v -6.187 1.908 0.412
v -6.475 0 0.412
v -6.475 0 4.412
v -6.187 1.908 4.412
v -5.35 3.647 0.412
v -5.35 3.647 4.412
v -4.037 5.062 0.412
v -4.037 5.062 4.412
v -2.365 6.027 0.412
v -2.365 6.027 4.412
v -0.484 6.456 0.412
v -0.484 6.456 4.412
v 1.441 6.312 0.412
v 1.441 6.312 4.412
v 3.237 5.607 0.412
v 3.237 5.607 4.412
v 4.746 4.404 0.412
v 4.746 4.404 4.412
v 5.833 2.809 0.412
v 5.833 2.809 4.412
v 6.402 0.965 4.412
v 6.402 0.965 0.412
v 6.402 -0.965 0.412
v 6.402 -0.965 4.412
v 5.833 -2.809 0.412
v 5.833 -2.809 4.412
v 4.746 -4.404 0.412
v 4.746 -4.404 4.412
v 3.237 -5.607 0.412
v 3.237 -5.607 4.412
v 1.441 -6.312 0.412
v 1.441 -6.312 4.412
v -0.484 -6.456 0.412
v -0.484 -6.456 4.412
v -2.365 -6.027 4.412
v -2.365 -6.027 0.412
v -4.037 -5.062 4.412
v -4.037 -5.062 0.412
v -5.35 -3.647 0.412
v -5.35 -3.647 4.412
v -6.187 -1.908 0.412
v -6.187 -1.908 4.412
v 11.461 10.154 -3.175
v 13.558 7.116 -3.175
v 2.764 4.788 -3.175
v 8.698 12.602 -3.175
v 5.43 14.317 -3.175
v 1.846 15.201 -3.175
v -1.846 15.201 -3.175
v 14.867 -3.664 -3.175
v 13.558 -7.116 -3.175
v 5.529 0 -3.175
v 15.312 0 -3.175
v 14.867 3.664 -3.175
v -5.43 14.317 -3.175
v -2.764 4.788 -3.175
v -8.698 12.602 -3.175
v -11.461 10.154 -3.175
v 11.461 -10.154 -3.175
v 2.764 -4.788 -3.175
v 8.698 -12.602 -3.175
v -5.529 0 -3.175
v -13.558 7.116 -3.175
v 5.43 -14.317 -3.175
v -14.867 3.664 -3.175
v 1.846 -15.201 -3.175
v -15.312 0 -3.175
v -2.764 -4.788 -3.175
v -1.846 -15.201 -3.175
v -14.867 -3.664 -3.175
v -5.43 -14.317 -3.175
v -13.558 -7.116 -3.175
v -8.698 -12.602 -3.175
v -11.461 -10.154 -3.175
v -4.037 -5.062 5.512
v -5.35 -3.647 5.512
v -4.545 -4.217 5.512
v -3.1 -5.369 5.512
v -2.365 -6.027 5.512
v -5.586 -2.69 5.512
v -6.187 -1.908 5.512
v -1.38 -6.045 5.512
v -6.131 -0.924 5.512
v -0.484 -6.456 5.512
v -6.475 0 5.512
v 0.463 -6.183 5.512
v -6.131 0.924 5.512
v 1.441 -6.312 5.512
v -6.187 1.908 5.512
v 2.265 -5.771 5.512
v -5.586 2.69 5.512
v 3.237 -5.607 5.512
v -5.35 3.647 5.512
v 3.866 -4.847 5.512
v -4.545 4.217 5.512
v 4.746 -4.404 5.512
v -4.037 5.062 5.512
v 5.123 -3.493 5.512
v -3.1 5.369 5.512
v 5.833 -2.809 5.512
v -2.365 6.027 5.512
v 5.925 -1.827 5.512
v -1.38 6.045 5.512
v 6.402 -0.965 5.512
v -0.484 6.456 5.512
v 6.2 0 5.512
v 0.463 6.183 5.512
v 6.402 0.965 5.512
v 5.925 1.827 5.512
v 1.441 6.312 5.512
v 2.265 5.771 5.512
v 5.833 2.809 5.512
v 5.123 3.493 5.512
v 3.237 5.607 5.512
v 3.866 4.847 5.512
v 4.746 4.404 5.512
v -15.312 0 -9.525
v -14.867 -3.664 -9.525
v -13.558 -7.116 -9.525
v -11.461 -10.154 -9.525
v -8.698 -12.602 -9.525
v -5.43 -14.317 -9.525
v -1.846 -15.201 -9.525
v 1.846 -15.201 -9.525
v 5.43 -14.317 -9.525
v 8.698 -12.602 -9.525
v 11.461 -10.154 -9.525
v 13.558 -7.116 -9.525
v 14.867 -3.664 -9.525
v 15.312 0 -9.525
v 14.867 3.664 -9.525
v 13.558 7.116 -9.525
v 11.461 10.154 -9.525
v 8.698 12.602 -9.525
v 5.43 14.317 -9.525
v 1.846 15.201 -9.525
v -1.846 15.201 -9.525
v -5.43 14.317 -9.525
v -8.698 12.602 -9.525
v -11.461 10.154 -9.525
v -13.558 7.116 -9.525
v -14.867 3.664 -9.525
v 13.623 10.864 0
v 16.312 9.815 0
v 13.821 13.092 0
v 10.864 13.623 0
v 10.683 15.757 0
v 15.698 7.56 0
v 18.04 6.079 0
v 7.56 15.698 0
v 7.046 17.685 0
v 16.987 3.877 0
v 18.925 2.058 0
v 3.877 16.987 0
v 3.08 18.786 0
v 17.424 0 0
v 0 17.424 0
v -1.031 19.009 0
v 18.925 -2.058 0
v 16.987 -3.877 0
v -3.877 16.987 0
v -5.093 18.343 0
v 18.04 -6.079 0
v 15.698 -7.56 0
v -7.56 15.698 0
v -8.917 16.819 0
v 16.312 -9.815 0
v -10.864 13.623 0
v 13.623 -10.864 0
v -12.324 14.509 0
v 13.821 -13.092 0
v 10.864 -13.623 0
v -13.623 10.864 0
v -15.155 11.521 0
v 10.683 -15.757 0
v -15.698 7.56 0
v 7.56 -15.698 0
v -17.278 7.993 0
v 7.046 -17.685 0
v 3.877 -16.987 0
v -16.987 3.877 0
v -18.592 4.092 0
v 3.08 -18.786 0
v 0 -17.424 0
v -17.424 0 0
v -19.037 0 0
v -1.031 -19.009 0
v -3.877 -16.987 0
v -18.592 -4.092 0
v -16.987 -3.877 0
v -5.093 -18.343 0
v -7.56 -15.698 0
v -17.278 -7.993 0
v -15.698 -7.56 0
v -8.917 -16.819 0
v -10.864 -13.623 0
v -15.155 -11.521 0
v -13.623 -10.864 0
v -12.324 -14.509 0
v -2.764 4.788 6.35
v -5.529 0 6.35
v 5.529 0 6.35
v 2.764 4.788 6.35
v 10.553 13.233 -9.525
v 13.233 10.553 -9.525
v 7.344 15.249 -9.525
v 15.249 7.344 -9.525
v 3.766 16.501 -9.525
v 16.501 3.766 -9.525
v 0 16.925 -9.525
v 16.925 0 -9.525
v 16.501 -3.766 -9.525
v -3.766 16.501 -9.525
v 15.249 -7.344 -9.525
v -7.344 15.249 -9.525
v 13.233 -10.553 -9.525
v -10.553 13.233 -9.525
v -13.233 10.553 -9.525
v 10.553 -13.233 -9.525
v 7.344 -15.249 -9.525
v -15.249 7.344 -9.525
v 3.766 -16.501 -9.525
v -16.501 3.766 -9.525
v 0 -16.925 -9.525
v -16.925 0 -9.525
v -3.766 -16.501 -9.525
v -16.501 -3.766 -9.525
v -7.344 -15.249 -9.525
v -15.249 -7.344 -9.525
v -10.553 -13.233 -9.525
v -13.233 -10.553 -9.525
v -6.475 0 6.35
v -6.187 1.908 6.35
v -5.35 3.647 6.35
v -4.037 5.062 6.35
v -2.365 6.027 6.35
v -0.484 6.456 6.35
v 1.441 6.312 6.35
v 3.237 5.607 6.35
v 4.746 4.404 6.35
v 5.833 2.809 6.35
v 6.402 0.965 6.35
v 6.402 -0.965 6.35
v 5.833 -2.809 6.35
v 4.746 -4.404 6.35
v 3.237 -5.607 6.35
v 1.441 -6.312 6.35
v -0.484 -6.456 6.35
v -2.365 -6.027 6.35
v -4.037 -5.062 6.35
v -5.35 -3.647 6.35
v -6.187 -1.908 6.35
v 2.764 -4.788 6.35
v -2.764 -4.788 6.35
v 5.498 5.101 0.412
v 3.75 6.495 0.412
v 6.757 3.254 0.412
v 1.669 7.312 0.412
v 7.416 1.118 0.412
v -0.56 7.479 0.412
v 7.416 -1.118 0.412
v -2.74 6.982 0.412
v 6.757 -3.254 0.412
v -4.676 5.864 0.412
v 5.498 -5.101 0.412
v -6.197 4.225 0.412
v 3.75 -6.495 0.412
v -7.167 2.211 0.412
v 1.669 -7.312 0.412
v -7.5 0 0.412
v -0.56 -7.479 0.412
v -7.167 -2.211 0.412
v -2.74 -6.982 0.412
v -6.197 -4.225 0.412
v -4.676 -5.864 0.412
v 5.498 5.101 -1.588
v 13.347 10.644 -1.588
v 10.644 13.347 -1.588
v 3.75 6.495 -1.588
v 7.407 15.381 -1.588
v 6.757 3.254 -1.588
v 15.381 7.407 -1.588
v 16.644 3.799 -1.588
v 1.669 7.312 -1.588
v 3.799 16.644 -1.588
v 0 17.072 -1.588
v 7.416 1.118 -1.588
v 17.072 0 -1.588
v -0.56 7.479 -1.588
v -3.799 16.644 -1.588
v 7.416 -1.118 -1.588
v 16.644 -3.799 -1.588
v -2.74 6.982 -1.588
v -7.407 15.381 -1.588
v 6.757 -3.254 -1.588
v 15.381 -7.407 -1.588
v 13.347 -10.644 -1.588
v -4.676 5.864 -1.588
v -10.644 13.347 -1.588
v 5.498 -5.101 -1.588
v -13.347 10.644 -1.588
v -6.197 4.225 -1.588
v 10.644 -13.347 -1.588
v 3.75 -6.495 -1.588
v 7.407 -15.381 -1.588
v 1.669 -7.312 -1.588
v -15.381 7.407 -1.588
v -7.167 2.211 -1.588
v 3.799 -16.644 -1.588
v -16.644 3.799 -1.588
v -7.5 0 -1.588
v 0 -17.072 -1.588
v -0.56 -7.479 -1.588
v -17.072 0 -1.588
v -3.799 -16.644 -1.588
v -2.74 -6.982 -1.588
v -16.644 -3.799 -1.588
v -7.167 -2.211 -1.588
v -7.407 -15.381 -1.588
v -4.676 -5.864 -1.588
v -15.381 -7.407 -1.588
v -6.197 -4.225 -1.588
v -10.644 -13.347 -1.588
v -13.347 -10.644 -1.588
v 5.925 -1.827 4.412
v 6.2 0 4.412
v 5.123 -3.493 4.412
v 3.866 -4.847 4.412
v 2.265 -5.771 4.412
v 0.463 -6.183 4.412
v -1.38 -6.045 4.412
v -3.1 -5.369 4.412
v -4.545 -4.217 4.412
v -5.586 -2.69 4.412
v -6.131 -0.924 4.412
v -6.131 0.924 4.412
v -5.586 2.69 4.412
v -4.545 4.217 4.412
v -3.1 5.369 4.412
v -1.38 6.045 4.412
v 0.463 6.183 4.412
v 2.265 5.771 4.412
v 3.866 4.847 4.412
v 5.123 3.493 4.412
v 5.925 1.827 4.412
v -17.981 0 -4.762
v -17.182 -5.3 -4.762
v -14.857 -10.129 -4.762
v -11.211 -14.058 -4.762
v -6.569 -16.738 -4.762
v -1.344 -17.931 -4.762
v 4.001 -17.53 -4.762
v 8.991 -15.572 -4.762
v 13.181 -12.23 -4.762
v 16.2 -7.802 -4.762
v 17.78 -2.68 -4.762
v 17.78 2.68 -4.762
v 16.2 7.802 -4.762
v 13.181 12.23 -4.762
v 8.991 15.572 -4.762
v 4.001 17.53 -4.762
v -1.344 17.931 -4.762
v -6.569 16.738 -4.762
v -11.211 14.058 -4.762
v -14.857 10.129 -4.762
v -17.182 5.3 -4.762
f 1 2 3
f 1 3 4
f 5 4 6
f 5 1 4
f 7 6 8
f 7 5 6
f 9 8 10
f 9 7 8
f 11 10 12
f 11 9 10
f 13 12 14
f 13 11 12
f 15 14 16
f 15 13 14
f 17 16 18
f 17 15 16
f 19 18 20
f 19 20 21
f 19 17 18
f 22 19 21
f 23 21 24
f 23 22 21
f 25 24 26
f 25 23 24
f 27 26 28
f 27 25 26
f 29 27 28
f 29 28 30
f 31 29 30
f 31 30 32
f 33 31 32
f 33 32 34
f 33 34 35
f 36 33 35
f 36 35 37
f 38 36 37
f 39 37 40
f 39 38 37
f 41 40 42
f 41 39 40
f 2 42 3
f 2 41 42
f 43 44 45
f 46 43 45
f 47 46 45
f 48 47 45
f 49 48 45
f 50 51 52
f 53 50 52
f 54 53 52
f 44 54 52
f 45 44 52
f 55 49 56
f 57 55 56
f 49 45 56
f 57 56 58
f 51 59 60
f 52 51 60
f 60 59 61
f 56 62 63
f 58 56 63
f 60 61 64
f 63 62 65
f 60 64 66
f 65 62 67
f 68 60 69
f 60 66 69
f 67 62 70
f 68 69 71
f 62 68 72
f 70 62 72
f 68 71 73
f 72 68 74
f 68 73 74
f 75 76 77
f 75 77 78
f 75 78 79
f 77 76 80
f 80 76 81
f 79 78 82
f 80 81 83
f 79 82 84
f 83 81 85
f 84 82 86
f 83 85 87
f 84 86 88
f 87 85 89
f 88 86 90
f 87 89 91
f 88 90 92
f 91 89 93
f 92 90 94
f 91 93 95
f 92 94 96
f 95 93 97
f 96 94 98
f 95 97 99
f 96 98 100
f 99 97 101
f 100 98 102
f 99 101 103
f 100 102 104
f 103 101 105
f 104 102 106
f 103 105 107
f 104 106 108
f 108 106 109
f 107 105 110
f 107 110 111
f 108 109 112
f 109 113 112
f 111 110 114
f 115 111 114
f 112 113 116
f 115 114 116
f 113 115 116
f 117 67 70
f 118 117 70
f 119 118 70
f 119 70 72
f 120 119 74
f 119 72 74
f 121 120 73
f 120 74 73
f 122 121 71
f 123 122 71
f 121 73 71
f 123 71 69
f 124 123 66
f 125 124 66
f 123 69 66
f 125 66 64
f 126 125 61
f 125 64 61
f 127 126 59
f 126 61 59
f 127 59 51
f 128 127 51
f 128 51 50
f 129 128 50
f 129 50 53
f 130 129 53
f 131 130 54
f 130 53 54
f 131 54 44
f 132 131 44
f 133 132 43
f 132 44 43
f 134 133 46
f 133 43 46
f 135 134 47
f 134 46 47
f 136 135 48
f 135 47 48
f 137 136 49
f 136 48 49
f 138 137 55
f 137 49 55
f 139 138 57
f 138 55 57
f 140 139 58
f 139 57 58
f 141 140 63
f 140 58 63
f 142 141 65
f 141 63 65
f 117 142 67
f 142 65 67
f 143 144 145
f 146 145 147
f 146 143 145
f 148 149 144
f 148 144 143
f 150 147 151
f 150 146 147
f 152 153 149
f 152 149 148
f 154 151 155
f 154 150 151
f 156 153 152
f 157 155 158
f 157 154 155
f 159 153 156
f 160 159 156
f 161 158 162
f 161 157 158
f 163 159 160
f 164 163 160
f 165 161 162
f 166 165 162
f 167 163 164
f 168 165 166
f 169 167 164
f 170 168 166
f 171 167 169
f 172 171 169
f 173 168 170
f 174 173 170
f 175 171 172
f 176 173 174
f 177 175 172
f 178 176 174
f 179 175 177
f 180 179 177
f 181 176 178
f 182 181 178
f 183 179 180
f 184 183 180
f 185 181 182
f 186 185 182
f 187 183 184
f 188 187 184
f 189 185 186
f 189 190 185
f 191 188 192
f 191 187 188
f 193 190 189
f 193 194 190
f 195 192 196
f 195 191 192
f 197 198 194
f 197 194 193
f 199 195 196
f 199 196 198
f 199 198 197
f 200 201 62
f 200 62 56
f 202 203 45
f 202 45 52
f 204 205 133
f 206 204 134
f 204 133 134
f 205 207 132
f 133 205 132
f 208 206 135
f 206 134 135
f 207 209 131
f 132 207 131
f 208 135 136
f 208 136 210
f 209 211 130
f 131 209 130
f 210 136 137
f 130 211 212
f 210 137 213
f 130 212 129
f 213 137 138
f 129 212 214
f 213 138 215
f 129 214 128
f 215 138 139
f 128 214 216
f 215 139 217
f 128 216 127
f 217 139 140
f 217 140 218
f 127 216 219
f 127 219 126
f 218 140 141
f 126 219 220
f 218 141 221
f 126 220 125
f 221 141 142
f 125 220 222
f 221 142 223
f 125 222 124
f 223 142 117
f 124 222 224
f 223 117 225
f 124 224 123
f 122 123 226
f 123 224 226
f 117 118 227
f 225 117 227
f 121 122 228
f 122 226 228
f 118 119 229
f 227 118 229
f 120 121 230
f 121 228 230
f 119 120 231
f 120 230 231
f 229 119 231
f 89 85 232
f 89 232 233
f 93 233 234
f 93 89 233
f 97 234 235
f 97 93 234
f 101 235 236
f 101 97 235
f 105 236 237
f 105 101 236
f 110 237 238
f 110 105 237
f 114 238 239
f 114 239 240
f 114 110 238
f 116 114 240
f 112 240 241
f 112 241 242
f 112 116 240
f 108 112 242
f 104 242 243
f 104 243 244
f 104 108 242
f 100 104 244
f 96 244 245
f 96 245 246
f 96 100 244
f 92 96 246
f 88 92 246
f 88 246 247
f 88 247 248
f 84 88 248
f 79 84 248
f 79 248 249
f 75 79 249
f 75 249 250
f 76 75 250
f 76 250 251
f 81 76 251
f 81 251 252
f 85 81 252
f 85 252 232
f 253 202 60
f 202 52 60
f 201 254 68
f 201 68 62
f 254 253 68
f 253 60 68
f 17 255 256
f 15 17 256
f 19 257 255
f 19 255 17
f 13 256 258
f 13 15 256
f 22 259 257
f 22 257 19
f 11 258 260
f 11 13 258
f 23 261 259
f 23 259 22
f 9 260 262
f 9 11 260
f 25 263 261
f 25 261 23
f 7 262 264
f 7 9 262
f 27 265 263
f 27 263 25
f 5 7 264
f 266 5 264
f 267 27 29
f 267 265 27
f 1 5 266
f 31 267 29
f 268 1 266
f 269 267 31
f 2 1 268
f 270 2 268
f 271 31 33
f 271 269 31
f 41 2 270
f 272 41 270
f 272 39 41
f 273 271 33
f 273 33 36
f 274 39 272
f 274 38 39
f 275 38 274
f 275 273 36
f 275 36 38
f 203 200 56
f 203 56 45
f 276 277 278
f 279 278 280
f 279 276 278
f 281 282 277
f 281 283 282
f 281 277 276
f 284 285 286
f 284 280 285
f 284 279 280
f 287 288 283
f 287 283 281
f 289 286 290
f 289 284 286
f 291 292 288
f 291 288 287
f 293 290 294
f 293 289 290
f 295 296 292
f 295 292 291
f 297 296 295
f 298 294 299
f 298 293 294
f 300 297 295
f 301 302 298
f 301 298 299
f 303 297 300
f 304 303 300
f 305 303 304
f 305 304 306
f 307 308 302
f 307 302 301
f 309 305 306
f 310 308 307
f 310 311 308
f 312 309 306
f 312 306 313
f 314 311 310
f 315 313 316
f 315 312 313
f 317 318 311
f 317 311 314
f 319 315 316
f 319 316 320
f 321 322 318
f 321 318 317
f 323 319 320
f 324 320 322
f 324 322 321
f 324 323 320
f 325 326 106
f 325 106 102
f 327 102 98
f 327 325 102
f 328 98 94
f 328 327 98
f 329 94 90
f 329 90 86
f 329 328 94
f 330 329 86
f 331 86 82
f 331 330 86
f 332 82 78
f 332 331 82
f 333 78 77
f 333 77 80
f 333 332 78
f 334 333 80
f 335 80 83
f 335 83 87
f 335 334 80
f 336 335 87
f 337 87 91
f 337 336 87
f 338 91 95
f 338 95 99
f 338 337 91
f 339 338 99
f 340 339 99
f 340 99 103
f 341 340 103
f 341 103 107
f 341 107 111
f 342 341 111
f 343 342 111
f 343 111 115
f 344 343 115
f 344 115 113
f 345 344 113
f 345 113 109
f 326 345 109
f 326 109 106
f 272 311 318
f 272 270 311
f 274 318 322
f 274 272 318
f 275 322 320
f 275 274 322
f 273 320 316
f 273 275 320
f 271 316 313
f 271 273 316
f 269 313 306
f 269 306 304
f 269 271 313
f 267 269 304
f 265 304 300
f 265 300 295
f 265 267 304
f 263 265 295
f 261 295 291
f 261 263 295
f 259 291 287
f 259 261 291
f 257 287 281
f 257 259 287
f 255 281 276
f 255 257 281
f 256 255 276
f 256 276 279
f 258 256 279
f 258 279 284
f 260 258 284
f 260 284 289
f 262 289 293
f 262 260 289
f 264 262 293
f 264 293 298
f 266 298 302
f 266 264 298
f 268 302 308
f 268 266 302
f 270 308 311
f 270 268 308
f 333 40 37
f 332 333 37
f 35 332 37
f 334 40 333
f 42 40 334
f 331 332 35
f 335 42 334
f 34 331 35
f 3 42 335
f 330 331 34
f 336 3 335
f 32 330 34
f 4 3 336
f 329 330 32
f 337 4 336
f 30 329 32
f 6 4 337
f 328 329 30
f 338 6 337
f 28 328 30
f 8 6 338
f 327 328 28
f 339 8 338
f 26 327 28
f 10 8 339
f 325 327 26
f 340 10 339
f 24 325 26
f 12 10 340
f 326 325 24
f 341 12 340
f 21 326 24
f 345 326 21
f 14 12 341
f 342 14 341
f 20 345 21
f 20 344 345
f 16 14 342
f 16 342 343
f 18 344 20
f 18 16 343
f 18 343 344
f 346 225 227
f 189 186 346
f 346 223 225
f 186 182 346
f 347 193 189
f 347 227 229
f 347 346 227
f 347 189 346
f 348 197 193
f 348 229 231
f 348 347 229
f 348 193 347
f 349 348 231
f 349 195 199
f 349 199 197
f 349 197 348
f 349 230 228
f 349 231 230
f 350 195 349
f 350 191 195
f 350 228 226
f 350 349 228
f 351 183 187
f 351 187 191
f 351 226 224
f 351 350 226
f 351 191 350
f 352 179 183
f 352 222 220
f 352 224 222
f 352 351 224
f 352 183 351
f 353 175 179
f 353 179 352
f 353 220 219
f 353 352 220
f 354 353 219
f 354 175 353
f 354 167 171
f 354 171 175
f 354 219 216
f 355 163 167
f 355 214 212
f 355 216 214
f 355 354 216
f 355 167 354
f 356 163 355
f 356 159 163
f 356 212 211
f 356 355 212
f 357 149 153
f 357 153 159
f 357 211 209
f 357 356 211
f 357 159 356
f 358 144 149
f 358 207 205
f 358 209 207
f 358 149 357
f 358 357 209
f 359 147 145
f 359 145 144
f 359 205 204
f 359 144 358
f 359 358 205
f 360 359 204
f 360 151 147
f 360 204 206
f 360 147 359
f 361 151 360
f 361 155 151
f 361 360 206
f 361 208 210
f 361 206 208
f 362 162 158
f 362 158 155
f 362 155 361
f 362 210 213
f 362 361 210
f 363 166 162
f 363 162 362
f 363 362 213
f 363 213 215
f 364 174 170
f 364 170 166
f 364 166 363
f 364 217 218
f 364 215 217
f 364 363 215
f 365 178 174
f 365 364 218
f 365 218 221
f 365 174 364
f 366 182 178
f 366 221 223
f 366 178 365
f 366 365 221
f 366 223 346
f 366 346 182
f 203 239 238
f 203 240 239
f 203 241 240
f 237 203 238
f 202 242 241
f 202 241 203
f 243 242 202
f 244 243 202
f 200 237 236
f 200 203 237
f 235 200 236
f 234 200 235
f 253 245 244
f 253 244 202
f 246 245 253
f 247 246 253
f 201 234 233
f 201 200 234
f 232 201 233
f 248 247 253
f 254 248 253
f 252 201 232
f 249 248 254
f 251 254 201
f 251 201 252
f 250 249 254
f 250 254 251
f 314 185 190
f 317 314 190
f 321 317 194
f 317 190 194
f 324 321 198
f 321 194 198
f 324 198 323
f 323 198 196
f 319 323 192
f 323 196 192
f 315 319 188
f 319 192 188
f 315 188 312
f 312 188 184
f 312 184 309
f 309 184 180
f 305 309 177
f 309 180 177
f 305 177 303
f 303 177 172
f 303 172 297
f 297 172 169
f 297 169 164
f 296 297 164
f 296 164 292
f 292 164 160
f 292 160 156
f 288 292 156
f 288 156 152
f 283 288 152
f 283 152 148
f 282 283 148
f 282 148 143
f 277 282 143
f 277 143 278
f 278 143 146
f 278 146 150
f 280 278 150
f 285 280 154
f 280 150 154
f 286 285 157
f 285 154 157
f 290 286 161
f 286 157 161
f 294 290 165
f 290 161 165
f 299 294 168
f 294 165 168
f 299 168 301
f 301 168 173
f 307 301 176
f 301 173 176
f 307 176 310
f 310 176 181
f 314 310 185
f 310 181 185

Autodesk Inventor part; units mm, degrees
ref_plane "YZ Plane" through (0, 0, 0) normal (1, 0, 0) x (0, 1, 0)
ref_plane "XZ Plane" through (0, 0, 0) normal (0, 1, 0) x (-1, 0, 0)
sketch "Sketch4" plane through (0, 0, 0) normal (0, 1, 0) x (-1, 0, 0)
  line L0 (0, 0) -> (6.5, 0) construction
  line L1 (6.5, 0) -> (6.5, -9.525)
  line L2 (6.5, -9.525) -> (0, -9.525)
  line L3 (0, -9.525) -> (0, 0)
  line L4 (0, -9.525) -> (19.05, -9.525)
  line L5 (19.05, -9.525) -> (19.05, 0) construction
  line L6 (19.05, 0) -> (0, 0)
  line L7 (0, 0) -> (0, -9.525) construction
  line L8 (19.05, 0) -> (16.9384, -9.525)
  line L9 (17.424, 0) -> (15.3123, -9.525)
  line L10 (15.6643, -7.9375) -> (6.5, -7.9375)
  line L11 (6.5, -7.9375) -> (7.5, -7.9375)
  line L12 (7.5, -7.9375) -> (7.5, -5.9375)
  line L13 (7.5, -5.9375) -> (6.5, -5.9375)
  line L14 (6.5, -5.9375) -> (6.5, -7.9375)
  line L15 (6.5, 0) -> (0, 0)
  line L16 (0, 0) -> (0, 6.35)
  line L17 (0, 6.35) -> (6.5, 6.35)
  line L18 (6.5, 6.35) -> (6.5, 0)
  line L19 (6.5, -3.175) -> (17.072, -3.175)
  line L20 (17.072, -3.175) -> (17.072, -1.5875) construction
  line L21 (17.072, -1.5875) -> (6.5, -1.5875)
  line L22 (6.5, -1.5875) -> (6.5, -3.175)
  line L23 (6.5, -3.175) -> (0, -3.175)
  line L24 (6.5, -1.5875) -> (7.5, -1.5875)
  line L25 (7.5, -1.5875) -> (7.5, 0.4125)
  line L26 (7.5, 0.4125) -> (6.5, 0.4125)
  line L27 (6.5, 0.4125) -> (6.5, -1.5875)
  line L28 (15.3123, -9.525) -> (15.3123, -3.175)
  point P0 (0, -3.175)
  point P1 (16.7201, -3.175)
  dimension "d28" = 6.5
  dimension "d30" = 19.05
  dimension "d31" = 9.525
  dimension "d32" = 12.5
  dimension "d33" = 1.5875
  dimension "d34" = 1.5875
  dimension "d36" = 1
  dimension "d37" = 2
  dimension "d53" = 6.35
  dimension "d54" = 1.5875
  dimension "d55" = 9.525
  dimension "d56" = 1
  dimension "d57" = 2
revolve "Revolution1" add sketch "Sketch4" angle 360 about axis through (0, 0, -9.525) along (0, 0, 1) contours L6 L25 L21 L1 | L1 L23 L3 L6 | L18 L26 L25 L6 | L6 L16 L17 L18 | L21 L9 L19 L1 | L6 L8 L4 L9 | L19 L9 L10 L28 | L10 L9 L28
sketch "Sketch5" plane through (0, 0, 0) normal (0, 0, 1) x (1, 0, 0)
  circle A0 centre (0, 0) radius 4.7625 construction
  line L0 (0, 0) -> (0, 4.7625) construction
  line L1 (2.7496, 4.7625) -> (5.4993, 0)
  line L2 (5.4993, 0) -> (2.7496, -4.7625)
  line L3 (2.7496, -4.7625) -> (-2.7496, -4.7625)
  line L4 (-2.7496, -4.7625) -> (-5.4993, 0)
  line L5 (-5.4993, 0) -> (-2.7496, 4.7625)
  line L6 (-2.7496, 4.7625) -> (2.7496, 4.7625)
  line L7 (-2.7496, 4.7625) -> (0, 0) construction
  arc A1 (-0.9165, 4.4712) -> (-2.6268, 4.5498) centre (-1.8331, 3.175) ccw
  arc A2 (-0.9165, 4.4712) -> (0, 4.1799) centre (0, 5.7674) ccw
  arc A3 (2.6268, 4.5498) -> (0.9165, 4.4712) centre (1.8331, 3.175) ccw
  arc A4 (0, 4.1799) -> (0.9165, 4.4712) centre (0, 5.7674) ccw
  arc A5 (-4.3304, 1.4418) -> (-5.2537, 0) centre (-3.6662, 0) ccw
  arc A6 (-4.3304, 1.4418) -> (-3.6199, 2.0899) centre (-4.9947, 2.8837) ccw
  arc A7 (-3.6199, 2.0899) -> (-3.4139, 3.0293) centre (-4.9947, 2.8837) ccw
  arc A8 (-2.6268, 4.5498) -> (-3.4139, 3.0293) centre (-1.8331, 3.175) ccw
  arc A9 (-3.4139, -3.0293) -> (-2.6268, -4.5498) centre (-1.8331, -3.175) ccw
  arc A10 (-3.4139, -3.0293) -> (-3.6199, -2.0899) centre (-4.9947, -2.8837) ccw
  arc A11 (-3.6199, -2.0899) -> (-4.3304, -1.4418) centre (-4.9947, -2.8837) ccw
  arc A12 (-5.2537, 0) -> (-4.3304, -1.4418) centre (-3.6662, 0) ccw
  arc A13 (0.9165, -4.4712) -> (2.6268, -4.5498) centre (1.8331, -3.175) ccw
  arc A14 (0.9165, -4.4712) -> (0, -4.1799) centre (0, -5.7674) ccw
  arc A15 (0, -4.1799) -> (-0.9165, -4.4712) centre (0, -5.7674) ccw
  arc A16 (-2.6268, -4.5498) -> (-0.9165, -4.4712) centre (-1.8331, -3.175) ccw
  arc A17 (4.3304, -1.4418) -> (5.2537, 0) centre (3.6662, 0) ccw
  arc A18 (4.3304, -1.4418) -> (3.6199, -2.0899) centre (4.9947, -2.8837) ccw
  arc A19 (3.6199, -2.0899) -> (3.4139, -3.0293) centre (4.9947, -2.8837) ccw
  arc A20 (2.6268, -4.5498) -> (3.4139, -3.0293) centre (1.8331, -3.175) ccw
  arc A21 (3.4139, 3.0293) -> (2.6268, 4.5498) centre (1.8331, 3.175) ccw
  arc A22 (3.4139, 3.0293) -> (3.6199, 2.0899) centre (4.9947, 2.8837) ccw
  arc A23 (3.6199, 2.0899) -> (4.3304, 1.4418) centre (4.9947, 2.8837) ccw
  arc A24 (5.2537, 0) -> (4.3304, 1.4418) centre (3.6662, 0) ccw
  point P0 (-1.8331, 4.7625)
  point P1 (-3.2079, 3.9688)
  point P2 (-5.041, 0.7937)
  point P3 (-5.041, -0.7938)
  point P4 (-3.2079, -3.9687)
  point P5 (-1.8331, -4.7625)
  point P6 (1.8331, -4.7625)
  point P7 (3.2079, -3.9687)
  point P8 (5.041, -0.7937)
  point P9 (5.041, 0.7937)
  point P10 (3.2079, 3.9687)
  point P11 (1.8331, 4.7625)
  dimension "d38" = 9.525
  dimension "d47" = 1.5875
  dimension "d48" = 1.5875
  dimension "d51" = 360
extrude "Extrusion4" cut sketch "Sketch5" along normal through all both and the other way through all
thicken "Thicken3" operation add thickness 0.0254 both sides no extend neighbours yes toward (0.9967573, -0.0804666, 0) faces at (-6.4789, 0.523, 2.3917)
ref_plane "Work Plane1" through (0, 0, 4.4125) normal (0, 0, 1) x (1, 0, 0)
sketch "Sketch6" plane through (0, 0, 4.4125) normal (0, 0, 1) x (1, 0, 0)
  circle A0 centre (0, 0) radius 6.2
  circle A1 centre (0, 0) radius 7.9375
  dimension "d43" = 12.4
  dimension "d44" = 15.875
extrude "Extrusion5" cut sketch "Sketch6" along normal blind 1.1
thicken "Thicken1" operation cut thickness 0.0127 both sides no extend neighbours yes toward (0.9505525, -0.2227193, 0.2164396) faces at (-17.8624, 4.1852, -3.175)
thicken "Thicken4" operation add thickness 0.0254 both sides no extend neighbours yes toward (0, 1, 0) faces at (0.9165, 4.7625, 3.175) (-4.5827, 1.5875, 3.175) (-4.5827, -1.5875, 0) (-0.9165, -4.7625, 0) (4.5827, -1.5875, 3.175) (4.5827, 1.5875, 0)
equation "\"d34\" = d33"
equation "\"d54\" = d34"
equation "\"d55\" = d31"
equation "\"d56\" = d36"
equation "\"d57\" = d37"
equation "\"d48\" = d47"
properties part number "Clutch" material "Stainless Steel"
